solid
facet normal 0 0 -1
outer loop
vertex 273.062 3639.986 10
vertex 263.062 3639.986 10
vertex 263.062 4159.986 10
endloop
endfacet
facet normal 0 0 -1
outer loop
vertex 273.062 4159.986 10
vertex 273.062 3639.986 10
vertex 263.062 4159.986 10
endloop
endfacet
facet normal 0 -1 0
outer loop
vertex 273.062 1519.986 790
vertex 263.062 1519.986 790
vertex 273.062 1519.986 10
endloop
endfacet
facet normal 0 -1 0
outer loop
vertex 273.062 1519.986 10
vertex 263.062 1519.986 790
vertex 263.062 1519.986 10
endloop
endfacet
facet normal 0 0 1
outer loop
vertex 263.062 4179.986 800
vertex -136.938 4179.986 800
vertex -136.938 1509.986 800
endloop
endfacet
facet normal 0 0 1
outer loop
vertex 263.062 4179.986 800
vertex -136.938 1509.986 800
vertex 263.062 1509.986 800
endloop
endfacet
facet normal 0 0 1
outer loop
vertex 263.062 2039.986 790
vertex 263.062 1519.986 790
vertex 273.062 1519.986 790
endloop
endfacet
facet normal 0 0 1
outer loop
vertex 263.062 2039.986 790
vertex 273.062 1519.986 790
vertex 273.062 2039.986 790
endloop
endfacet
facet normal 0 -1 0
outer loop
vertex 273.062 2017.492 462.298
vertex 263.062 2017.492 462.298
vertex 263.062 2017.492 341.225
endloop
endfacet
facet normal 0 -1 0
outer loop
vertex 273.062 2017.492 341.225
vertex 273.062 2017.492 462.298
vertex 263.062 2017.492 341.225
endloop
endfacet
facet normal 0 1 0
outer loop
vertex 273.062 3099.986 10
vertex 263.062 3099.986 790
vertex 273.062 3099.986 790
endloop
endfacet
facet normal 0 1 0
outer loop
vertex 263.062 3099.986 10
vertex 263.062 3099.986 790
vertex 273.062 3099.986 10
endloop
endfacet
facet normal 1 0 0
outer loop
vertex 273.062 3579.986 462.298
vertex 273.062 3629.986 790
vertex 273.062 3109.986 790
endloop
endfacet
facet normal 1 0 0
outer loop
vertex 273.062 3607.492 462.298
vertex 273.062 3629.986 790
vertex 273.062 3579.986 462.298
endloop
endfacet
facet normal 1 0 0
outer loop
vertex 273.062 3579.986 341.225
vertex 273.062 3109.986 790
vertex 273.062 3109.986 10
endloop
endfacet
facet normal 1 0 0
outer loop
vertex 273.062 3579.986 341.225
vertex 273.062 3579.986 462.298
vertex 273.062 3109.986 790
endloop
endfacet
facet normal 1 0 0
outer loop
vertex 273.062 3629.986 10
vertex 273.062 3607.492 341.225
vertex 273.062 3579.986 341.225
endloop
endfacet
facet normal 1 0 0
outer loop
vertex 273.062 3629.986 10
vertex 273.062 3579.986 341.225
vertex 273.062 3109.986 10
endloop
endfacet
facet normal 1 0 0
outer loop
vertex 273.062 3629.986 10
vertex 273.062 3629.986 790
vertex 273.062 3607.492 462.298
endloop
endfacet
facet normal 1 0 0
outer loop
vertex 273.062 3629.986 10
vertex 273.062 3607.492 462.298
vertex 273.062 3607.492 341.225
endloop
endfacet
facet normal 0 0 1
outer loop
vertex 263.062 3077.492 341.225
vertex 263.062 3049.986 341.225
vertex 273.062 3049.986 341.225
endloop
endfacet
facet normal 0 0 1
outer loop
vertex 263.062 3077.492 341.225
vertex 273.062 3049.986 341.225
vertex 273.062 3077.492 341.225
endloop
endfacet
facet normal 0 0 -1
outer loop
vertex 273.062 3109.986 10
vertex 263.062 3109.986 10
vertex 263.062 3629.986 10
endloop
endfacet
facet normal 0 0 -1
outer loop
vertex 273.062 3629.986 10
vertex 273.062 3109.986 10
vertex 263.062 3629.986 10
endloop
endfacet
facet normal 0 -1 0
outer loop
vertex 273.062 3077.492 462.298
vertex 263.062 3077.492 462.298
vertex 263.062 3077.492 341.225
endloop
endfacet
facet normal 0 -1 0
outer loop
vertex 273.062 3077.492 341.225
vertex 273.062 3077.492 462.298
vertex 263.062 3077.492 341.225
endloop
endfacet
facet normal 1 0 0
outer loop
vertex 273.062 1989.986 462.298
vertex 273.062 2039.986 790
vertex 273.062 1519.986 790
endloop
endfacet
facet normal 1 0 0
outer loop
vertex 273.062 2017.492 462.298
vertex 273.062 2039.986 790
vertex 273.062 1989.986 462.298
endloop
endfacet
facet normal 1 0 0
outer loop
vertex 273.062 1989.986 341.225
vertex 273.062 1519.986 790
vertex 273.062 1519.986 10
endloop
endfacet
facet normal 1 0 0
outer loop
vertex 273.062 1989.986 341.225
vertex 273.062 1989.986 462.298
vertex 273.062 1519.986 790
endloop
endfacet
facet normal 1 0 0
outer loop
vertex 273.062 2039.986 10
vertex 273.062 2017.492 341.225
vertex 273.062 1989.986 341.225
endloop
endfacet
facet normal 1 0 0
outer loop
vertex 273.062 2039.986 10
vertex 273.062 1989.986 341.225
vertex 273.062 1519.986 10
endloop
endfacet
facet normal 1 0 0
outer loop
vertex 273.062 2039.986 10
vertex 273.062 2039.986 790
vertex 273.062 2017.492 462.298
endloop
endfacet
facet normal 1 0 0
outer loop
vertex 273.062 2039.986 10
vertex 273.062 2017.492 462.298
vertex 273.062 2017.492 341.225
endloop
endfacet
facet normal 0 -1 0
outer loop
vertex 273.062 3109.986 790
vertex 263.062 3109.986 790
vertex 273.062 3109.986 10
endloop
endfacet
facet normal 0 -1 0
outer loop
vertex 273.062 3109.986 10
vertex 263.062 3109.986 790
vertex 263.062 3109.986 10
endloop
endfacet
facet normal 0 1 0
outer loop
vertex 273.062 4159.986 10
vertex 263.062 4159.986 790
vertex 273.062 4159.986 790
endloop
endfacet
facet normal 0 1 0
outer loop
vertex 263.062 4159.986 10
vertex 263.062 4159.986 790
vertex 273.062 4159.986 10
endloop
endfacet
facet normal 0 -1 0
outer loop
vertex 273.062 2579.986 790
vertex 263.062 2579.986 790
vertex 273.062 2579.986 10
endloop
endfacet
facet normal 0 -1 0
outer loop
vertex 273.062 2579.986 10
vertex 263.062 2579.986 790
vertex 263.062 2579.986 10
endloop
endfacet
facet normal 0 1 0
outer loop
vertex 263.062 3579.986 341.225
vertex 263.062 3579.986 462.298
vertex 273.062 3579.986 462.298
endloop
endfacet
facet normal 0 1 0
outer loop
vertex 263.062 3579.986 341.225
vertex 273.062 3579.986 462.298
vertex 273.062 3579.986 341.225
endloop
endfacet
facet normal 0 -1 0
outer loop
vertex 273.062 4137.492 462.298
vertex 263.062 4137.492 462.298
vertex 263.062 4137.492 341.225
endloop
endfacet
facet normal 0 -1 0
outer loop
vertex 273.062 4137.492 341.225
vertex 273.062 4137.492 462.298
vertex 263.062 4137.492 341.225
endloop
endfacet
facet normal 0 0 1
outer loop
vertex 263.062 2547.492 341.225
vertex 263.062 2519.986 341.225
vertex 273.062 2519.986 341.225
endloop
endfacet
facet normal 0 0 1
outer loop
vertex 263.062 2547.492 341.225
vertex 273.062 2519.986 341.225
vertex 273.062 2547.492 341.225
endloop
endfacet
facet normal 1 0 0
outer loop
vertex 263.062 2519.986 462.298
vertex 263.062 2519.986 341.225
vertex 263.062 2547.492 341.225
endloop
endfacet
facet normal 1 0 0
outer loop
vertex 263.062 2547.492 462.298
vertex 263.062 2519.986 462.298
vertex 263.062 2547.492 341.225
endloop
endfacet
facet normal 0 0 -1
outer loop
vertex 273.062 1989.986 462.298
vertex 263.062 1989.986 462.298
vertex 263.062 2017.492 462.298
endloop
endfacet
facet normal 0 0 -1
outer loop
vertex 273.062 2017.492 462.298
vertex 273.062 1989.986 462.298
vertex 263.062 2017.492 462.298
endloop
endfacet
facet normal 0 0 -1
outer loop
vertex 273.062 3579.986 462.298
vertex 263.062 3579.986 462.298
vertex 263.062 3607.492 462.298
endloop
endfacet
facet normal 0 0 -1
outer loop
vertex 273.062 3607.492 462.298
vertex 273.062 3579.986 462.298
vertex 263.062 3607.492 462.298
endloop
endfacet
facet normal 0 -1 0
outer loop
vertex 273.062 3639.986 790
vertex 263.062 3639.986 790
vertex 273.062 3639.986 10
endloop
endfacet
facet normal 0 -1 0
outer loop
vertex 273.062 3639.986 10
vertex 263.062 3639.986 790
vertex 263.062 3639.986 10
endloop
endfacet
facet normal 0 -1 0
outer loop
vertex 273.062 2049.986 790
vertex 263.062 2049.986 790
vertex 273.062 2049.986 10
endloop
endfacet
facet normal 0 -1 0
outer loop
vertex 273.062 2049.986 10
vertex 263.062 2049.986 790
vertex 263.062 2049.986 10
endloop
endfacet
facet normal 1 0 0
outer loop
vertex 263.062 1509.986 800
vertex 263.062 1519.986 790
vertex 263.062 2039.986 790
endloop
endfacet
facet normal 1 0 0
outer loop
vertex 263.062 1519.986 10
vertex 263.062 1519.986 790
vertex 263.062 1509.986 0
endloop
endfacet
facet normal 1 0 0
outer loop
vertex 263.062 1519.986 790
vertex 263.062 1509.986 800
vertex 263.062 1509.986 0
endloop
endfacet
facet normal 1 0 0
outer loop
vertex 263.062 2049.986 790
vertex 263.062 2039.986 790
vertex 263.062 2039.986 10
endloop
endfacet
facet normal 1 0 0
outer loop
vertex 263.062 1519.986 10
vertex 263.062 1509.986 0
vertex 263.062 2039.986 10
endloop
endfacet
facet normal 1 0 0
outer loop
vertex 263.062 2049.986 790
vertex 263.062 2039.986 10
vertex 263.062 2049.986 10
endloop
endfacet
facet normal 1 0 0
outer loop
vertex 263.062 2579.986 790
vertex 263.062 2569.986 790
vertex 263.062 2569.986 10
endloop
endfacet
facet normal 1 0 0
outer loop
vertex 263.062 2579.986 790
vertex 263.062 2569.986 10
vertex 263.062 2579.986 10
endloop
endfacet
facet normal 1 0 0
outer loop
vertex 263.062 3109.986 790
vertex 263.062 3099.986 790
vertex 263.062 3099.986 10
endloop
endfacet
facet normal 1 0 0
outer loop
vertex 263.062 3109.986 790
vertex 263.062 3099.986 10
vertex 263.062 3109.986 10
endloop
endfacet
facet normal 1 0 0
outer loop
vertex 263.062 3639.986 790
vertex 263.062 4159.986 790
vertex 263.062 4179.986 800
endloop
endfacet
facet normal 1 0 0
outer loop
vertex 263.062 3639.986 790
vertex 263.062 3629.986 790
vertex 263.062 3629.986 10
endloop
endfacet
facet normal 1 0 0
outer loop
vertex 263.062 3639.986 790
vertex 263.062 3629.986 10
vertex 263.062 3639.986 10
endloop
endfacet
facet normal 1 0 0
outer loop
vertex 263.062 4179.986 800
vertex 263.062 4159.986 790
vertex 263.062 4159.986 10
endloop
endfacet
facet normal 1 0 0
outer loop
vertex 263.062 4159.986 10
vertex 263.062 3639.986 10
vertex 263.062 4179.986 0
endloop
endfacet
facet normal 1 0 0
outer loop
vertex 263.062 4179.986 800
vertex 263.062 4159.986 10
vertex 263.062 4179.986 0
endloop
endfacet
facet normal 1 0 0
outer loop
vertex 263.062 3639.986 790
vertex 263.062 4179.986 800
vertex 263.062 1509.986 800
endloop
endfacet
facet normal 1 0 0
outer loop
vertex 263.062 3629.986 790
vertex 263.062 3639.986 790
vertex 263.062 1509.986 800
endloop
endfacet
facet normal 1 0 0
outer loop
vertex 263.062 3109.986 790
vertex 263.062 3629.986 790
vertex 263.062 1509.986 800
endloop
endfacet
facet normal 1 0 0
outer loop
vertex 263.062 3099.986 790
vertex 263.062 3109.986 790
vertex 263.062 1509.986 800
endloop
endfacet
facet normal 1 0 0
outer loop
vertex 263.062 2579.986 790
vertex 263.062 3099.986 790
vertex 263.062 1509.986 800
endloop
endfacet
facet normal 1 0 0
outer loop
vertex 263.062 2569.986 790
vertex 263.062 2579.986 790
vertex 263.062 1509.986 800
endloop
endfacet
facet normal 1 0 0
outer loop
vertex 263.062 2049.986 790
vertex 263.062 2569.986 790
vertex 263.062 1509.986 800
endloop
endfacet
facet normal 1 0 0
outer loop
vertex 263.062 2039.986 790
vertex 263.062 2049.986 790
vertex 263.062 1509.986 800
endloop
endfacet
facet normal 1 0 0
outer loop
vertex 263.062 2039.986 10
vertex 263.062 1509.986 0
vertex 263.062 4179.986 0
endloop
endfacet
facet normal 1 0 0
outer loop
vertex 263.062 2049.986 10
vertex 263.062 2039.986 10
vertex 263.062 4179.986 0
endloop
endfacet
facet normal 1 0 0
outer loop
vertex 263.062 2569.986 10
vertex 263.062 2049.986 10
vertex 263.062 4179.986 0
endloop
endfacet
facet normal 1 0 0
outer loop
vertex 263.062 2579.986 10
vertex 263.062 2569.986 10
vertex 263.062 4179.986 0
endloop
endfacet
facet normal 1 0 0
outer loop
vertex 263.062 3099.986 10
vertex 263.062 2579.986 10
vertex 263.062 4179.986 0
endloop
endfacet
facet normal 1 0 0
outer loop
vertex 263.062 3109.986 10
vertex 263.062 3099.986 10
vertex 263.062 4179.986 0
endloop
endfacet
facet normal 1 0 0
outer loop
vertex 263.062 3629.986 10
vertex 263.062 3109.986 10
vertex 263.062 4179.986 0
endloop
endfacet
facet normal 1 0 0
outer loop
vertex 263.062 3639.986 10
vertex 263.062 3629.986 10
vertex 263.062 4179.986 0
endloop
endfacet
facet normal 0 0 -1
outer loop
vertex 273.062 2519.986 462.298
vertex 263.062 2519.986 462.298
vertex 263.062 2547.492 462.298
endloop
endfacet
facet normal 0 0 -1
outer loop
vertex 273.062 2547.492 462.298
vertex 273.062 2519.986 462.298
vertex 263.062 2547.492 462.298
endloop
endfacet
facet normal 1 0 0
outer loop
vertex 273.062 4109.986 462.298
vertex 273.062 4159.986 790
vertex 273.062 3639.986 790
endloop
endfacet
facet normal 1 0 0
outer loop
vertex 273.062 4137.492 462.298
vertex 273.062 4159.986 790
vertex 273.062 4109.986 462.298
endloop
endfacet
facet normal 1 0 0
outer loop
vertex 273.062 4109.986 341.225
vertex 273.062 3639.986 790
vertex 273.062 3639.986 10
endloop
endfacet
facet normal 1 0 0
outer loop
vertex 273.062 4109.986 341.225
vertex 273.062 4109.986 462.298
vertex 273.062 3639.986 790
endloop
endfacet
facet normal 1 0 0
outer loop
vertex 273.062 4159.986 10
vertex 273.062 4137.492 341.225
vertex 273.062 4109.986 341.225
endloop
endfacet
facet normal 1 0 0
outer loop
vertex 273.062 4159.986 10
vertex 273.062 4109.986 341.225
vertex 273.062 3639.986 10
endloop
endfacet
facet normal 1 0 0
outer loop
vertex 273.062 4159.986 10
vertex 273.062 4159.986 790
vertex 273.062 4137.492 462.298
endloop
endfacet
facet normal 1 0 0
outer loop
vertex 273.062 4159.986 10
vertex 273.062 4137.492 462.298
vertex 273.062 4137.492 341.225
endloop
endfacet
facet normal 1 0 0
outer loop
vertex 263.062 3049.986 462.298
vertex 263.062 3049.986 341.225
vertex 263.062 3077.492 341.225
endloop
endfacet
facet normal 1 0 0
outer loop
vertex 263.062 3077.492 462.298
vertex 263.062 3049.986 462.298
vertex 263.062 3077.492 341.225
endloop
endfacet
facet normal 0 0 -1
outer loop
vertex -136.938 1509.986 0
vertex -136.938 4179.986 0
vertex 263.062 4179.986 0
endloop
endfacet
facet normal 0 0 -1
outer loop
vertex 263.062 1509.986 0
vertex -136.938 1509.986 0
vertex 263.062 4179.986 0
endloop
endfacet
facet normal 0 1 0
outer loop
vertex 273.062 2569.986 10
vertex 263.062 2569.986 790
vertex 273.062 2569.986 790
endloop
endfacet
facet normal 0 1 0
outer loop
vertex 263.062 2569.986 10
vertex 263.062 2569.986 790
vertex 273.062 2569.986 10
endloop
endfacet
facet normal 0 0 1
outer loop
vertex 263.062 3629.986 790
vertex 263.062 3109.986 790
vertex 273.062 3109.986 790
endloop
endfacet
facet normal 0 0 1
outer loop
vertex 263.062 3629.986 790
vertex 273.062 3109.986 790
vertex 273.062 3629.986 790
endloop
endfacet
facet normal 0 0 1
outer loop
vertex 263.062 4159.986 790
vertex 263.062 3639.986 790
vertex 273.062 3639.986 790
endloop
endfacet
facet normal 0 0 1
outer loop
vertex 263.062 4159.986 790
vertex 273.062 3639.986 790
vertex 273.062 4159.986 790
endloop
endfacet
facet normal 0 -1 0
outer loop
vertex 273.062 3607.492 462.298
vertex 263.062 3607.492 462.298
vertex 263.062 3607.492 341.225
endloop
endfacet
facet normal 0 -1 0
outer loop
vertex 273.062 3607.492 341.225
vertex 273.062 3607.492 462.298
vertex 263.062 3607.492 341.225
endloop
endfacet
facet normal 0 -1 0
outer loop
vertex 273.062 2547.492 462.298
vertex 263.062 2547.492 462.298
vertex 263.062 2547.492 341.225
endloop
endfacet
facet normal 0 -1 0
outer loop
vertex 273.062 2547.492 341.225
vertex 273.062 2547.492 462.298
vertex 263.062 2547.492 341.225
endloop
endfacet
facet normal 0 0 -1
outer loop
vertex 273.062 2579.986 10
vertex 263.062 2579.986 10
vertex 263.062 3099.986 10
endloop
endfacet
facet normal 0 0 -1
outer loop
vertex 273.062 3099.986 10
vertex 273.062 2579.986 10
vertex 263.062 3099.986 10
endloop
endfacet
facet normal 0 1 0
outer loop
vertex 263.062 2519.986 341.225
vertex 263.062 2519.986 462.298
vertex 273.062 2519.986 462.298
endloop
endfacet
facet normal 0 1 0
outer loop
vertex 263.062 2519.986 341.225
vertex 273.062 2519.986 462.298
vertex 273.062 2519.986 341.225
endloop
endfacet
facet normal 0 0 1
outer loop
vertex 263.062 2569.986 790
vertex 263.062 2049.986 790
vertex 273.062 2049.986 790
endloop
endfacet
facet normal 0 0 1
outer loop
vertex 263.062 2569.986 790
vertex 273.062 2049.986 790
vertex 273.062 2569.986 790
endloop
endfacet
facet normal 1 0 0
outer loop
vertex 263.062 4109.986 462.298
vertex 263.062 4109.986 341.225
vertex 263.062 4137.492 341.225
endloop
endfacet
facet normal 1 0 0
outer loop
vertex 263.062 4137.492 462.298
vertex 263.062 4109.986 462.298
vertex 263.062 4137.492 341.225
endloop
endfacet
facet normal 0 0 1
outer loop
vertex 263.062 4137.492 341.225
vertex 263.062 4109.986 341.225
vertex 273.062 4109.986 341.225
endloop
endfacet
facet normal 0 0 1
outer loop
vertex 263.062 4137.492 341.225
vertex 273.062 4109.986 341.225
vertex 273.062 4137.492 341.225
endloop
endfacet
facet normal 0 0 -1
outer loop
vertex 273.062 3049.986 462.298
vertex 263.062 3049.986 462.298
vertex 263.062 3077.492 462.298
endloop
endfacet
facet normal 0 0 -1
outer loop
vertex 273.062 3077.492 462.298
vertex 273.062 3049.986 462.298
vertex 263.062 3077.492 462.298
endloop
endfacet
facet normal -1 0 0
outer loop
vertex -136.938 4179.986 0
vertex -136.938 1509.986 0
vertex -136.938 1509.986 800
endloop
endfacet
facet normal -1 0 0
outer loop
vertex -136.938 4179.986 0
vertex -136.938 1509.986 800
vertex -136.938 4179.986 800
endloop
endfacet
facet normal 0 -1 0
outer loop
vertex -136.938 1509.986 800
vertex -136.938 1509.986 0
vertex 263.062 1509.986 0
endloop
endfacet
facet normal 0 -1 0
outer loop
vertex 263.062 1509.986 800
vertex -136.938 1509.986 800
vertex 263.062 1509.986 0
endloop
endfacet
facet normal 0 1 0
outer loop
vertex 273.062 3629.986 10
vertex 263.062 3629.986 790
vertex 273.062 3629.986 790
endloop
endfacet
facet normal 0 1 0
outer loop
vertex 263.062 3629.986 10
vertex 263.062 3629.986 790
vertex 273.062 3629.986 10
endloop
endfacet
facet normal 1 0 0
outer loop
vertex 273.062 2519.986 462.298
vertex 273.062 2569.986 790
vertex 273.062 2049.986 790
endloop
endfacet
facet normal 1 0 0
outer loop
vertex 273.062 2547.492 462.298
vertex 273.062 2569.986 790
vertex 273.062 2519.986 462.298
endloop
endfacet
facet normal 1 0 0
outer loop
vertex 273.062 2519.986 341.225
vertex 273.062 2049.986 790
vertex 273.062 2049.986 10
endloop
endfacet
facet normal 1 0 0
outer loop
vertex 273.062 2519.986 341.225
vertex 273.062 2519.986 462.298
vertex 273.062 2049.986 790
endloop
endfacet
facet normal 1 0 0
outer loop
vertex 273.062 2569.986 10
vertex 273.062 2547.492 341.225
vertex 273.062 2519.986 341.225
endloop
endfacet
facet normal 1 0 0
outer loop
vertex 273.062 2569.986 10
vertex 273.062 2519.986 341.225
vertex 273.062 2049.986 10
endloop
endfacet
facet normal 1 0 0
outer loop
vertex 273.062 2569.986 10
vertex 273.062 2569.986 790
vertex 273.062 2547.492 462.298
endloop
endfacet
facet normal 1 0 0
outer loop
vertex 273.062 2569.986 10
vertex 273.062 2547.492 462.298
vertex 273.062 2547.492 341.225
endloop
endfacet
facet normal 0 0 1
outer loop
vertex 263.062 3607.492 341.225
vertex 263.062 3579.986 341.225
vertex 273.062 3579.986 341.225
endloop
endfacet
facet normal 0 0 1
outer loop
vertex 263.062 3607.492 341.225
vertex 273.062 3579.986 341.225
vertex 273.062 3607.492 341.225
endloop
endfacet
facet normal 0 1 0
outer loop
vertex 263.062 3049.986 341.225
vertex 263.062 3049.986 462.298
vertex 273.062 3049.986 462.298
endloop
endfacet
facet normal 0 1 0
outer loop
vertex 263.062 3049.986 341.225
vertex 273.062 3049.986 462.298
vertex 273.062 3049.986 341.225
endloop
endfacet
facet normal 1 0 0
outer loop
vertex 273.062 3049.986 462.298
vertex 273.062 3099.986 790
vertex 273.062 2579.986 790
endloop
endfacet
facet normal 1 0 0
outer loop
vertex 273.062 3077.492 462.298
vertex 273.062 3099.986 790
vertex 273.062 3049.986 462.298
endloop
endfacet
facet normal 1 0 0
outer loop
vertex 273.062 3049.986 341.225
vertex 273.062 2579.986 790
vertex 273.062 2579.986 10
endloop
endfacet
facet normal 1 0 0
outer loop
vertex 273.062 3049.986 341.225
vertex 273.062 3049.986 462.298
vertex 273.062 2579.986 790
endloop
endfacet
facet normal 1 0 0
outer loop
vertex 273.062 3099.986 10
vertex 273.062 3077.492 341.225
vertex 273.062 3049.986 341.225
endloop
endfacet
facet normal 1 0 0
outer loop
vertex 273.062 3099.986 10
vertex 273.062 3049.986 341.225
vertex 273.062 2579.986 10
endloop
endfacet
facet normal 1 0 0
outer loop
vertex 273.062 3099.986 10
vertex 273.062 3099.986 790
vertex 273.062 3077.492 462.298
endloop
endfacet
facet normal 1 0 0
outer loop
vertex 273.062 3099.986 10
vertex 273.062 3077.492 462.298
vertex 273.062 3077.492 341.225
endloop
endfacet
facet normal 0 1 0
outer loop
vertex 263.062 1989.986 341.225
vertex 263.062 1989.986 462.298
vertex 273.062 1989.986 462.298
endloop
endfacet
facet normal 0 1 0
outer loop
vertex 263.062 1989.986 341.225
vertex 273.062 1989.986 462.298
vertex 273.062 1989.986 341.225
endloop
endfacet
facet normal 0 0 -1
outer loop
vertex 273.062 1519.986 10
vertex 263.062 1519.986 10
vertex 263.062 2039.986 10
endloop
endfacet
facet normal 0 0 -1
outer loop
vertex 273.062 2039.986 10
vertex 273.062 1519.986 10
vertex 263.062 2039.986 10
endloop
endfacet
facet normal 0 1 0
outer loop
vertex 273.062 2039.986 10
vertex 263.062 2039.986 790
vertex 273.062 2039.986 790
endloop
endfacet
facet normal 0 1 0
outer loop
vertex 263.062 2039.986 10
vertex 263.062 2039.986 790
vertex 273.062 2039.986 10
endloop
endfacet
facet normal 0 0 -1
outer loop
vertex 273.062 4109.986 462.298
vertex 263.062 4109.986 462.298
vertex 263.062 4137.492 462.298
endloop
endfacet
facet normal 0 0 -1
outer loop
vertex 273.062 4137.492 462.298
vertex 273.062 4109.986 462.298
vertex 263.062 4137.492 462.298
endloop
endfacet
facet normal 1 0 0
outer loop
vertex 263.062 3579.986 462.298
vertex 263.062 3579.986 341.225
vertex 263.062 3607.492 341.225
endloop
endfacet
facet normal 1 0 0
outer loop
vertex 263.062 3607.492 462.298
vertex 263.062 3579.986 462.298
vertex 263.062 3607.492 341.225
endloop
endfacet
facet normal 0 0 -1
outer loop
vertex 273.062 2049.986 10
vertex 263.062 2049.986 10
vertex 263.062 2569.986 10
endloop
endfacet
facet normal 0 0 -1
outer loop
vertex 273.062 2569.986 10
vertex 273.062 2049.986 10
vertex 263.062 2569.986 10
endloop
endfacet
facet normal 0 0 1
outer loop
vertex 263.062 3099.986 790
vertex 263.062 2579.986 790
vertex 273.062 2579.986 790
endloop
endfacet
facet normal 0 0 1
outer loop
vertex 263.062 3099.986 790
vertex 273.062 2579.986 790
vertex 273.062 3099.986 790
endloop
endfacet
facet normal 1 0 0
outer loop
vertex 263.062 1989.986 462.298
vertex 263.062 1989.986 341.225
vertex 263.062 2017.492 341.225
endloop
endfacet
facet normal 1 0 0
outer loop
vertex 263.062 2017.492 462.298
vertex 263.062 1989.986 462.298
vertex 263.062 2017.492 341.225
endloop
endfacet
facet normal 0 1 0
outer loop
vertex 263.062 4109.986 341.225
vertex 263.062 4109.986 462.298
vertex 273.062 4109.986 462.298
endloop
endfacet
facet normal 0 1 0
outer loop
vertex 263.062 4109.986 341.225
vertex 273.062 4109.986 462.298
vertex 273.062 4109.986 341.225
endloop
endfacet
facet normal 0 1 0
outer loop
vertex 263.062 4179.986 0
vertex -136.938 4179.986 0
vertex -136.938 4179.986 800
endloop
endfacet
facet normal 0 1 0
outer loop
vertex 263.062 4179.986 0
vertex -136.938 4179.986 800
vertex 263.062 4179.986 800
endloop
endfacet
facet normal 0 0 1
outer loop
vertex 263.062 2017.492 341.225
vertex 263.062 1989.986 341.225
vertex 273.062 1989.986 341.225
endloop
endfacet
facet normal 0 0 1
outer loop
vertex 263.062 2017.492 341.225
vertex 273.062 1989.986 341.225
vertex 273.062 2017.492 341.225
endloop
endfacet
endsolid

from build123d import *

# Parameters (mm, degrees)
SKETCH1_W           = 400
SKETCH1_H           = 2670
BOSS_EXTRUDE1_DEPTH = 800
SKETCH3_W           = 780
SKETCH3_H           = 520
SKETCH3_W_2         = 121.072841775
SKETCH3_H_2         = 27.505181151
BOSS_EXTRUDE3_DEPTH = 10


with BuildPart() as part:
    # Sketch1 → Boss-Extrude1 (new body)
    with BuildSketch(Plane.XY):
        with Locations((63.061970043, 2844.986327315)):
            Rectangle(SKETCH1_W, SKETCH1_H)
    extrude(amount=BOSS_EXTRUDE1_DEPTH)

    # Sketch3 → Boss-Extrude3 (add)
    with BuildSketch(Plane(origin=(263.061970043, 0, 0), x_dir=(0, 0, -1), z_dir=(1, 0, 0))):
        with Locations((-400, 2309.986327315)):
            Rectangle(SKETCH3_W, SKETCH3_H)
        with Locations((-401.761491339, 2533.738917891)):
            Rectangle(SKETCH3_W_2, SKETCH3_H_2, mode=Mode.SUBTRACT)
        with Locations((-400, 2839.986327315)):
            Rectangle(SKETCH3_W, SKETCH3_H)
        with Locations((-401.761491339, 3063.738917891)):
            Rectangle(SKETCH3_W_2, SKETCH3_H_2, mode=Mode.SUBTRACT)
        with Locations((-400, 3369.986327315)):
            Rectangle(SKETCH3_W, SKETCH3_H)
        with Locations((-401.761491339, 3593.738917891)):
            Rectangle(SKETCH3_W_2, SKETCH3_H_2, mode=Mode.SUBTRACT)
        with Locations((-400, 3899.986327315)):
            Rectangle(SKETCH3_W, SKETCH3_H)
        with Locations((-401.761491339, 4123.738917891)):
            Rectangle(SKETCH3_W_2, SKETCH3_H_2, mode=Mode.SUBTRACT)
        with Locations((-400, 1779.986327315)):
            Rectangle(SKETCH3_W, SKETCH3_H)
        with Locations((-401.761491339, 2003.738917891)):
            Rectangle(SKETCH3_W_2, SKETCH3_H_2, mode=Mode.SUBTRACT)
    extrude(amount=BOSS_EXTRUDE3_DEPTH)


solid = part.part
